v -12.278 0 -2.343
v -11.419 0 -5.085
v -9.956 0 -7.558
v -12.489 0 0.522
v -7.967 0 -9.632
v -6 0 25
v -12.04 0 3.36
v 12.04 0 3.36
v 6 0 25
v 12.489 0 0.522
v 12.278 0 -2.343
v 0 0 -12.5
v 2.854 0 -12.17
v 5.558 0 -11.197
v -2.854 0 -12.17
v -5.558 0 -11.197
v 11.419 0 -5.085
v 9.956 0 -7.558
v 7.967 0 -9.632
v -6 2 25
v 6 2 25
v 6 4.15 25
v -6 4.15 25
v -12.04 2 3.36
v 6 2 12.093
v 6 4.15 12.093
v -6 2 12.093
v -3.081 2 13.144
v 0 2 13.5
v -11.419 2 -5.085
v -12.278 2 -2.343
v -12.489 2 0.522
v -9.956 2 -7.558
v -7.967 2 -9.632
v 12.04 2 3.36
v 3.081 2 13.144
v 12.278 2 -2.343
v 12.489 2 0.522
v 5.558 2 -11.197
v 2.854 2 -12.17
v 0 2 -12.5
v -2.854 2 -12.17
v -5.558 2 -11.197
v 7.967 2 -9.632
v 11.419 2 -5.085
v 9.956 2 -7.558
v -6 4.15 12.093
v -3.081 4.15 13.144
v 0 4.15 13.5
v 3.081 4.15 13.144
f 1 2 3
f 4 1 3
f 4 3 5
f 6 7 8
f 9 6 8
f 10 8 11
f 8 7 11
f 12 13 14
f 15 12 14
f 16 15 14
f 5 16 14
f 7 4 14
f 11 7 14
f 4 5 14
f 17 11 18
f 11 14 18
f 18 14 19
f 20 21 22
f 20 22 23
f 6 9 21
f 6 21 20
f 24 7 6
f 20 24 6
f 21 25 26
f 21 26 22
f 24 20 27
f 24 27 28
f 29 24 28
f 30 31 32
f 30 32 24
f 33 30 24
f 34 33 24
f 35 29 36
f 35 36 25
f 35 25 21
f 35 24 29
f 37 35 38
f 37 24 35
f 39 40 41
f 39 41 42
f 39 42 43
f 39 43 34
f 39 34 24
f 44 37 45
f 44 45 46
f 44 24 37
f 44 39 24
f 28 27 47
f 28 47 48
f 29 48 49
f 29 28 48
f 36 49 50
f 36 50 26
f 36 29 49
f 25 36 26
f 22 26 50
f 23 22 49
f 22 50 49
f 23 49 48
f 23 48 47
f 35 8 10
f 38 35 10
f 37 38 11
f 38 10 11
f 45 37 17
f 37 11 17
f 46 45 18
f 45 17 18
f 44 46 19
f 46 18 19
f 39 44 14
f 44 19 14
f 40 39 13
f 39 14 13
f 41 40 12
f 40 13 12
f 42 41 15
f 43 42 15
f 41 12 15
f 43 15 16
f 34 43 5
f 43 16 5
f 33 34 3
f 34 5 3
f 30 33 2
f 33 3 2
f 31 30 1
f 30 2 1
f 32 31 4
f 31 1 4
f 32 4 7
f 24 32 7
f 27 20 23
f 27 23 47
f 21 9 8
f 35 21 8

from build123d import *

# Parameters (mm, degrees)
BOSS_EXTRUDE1_DEPTH = 2
BOSS_EXTRUDE2_DEPTH = 2.15


with BuildPart() as part:
    # Sketch1 → Boss-Extrude1 (new body)
    with BuildSketch(Plane(origin=(0, 0, 0), x_dir=(1, 0, 0), z_dir=(0, 1, 0))):
        with BuildLine():
            Line((-12.039826938, -3.360441535), (-6, -25))
            Line((-6, -25), (6, -25))
            Line((6, -25), (12.039826938, -3.360441535))
            ThreePointArc((12.039826938, -3.360441535), (0, 12.5), (-12.039826938, -3.360441535))
        make_face()
    extrude(amount=BOSS_EXTRUDE1_DEPTH)

    # Sketch2 → Boss-Extrude2 (add)
    with BuildSketch(Plane(origin=(0, 2, 0), x_dir=(1, 0, 0), z_dir=(0, 1, 0))):
        with BuildLine():
            Line((-6, -25), (-6, -12.093386622))
            ThreePointArc((-6, -12.093386622), (0, -13.5), (6, -12.093386622))
            Line((6, -12.093386622), (6, -25))
            Line((6, -25), (-6, -25))
        make_face()
    extrude(amount=BOSS_EXTRUDE2_DEPTH)


solid = part.part
